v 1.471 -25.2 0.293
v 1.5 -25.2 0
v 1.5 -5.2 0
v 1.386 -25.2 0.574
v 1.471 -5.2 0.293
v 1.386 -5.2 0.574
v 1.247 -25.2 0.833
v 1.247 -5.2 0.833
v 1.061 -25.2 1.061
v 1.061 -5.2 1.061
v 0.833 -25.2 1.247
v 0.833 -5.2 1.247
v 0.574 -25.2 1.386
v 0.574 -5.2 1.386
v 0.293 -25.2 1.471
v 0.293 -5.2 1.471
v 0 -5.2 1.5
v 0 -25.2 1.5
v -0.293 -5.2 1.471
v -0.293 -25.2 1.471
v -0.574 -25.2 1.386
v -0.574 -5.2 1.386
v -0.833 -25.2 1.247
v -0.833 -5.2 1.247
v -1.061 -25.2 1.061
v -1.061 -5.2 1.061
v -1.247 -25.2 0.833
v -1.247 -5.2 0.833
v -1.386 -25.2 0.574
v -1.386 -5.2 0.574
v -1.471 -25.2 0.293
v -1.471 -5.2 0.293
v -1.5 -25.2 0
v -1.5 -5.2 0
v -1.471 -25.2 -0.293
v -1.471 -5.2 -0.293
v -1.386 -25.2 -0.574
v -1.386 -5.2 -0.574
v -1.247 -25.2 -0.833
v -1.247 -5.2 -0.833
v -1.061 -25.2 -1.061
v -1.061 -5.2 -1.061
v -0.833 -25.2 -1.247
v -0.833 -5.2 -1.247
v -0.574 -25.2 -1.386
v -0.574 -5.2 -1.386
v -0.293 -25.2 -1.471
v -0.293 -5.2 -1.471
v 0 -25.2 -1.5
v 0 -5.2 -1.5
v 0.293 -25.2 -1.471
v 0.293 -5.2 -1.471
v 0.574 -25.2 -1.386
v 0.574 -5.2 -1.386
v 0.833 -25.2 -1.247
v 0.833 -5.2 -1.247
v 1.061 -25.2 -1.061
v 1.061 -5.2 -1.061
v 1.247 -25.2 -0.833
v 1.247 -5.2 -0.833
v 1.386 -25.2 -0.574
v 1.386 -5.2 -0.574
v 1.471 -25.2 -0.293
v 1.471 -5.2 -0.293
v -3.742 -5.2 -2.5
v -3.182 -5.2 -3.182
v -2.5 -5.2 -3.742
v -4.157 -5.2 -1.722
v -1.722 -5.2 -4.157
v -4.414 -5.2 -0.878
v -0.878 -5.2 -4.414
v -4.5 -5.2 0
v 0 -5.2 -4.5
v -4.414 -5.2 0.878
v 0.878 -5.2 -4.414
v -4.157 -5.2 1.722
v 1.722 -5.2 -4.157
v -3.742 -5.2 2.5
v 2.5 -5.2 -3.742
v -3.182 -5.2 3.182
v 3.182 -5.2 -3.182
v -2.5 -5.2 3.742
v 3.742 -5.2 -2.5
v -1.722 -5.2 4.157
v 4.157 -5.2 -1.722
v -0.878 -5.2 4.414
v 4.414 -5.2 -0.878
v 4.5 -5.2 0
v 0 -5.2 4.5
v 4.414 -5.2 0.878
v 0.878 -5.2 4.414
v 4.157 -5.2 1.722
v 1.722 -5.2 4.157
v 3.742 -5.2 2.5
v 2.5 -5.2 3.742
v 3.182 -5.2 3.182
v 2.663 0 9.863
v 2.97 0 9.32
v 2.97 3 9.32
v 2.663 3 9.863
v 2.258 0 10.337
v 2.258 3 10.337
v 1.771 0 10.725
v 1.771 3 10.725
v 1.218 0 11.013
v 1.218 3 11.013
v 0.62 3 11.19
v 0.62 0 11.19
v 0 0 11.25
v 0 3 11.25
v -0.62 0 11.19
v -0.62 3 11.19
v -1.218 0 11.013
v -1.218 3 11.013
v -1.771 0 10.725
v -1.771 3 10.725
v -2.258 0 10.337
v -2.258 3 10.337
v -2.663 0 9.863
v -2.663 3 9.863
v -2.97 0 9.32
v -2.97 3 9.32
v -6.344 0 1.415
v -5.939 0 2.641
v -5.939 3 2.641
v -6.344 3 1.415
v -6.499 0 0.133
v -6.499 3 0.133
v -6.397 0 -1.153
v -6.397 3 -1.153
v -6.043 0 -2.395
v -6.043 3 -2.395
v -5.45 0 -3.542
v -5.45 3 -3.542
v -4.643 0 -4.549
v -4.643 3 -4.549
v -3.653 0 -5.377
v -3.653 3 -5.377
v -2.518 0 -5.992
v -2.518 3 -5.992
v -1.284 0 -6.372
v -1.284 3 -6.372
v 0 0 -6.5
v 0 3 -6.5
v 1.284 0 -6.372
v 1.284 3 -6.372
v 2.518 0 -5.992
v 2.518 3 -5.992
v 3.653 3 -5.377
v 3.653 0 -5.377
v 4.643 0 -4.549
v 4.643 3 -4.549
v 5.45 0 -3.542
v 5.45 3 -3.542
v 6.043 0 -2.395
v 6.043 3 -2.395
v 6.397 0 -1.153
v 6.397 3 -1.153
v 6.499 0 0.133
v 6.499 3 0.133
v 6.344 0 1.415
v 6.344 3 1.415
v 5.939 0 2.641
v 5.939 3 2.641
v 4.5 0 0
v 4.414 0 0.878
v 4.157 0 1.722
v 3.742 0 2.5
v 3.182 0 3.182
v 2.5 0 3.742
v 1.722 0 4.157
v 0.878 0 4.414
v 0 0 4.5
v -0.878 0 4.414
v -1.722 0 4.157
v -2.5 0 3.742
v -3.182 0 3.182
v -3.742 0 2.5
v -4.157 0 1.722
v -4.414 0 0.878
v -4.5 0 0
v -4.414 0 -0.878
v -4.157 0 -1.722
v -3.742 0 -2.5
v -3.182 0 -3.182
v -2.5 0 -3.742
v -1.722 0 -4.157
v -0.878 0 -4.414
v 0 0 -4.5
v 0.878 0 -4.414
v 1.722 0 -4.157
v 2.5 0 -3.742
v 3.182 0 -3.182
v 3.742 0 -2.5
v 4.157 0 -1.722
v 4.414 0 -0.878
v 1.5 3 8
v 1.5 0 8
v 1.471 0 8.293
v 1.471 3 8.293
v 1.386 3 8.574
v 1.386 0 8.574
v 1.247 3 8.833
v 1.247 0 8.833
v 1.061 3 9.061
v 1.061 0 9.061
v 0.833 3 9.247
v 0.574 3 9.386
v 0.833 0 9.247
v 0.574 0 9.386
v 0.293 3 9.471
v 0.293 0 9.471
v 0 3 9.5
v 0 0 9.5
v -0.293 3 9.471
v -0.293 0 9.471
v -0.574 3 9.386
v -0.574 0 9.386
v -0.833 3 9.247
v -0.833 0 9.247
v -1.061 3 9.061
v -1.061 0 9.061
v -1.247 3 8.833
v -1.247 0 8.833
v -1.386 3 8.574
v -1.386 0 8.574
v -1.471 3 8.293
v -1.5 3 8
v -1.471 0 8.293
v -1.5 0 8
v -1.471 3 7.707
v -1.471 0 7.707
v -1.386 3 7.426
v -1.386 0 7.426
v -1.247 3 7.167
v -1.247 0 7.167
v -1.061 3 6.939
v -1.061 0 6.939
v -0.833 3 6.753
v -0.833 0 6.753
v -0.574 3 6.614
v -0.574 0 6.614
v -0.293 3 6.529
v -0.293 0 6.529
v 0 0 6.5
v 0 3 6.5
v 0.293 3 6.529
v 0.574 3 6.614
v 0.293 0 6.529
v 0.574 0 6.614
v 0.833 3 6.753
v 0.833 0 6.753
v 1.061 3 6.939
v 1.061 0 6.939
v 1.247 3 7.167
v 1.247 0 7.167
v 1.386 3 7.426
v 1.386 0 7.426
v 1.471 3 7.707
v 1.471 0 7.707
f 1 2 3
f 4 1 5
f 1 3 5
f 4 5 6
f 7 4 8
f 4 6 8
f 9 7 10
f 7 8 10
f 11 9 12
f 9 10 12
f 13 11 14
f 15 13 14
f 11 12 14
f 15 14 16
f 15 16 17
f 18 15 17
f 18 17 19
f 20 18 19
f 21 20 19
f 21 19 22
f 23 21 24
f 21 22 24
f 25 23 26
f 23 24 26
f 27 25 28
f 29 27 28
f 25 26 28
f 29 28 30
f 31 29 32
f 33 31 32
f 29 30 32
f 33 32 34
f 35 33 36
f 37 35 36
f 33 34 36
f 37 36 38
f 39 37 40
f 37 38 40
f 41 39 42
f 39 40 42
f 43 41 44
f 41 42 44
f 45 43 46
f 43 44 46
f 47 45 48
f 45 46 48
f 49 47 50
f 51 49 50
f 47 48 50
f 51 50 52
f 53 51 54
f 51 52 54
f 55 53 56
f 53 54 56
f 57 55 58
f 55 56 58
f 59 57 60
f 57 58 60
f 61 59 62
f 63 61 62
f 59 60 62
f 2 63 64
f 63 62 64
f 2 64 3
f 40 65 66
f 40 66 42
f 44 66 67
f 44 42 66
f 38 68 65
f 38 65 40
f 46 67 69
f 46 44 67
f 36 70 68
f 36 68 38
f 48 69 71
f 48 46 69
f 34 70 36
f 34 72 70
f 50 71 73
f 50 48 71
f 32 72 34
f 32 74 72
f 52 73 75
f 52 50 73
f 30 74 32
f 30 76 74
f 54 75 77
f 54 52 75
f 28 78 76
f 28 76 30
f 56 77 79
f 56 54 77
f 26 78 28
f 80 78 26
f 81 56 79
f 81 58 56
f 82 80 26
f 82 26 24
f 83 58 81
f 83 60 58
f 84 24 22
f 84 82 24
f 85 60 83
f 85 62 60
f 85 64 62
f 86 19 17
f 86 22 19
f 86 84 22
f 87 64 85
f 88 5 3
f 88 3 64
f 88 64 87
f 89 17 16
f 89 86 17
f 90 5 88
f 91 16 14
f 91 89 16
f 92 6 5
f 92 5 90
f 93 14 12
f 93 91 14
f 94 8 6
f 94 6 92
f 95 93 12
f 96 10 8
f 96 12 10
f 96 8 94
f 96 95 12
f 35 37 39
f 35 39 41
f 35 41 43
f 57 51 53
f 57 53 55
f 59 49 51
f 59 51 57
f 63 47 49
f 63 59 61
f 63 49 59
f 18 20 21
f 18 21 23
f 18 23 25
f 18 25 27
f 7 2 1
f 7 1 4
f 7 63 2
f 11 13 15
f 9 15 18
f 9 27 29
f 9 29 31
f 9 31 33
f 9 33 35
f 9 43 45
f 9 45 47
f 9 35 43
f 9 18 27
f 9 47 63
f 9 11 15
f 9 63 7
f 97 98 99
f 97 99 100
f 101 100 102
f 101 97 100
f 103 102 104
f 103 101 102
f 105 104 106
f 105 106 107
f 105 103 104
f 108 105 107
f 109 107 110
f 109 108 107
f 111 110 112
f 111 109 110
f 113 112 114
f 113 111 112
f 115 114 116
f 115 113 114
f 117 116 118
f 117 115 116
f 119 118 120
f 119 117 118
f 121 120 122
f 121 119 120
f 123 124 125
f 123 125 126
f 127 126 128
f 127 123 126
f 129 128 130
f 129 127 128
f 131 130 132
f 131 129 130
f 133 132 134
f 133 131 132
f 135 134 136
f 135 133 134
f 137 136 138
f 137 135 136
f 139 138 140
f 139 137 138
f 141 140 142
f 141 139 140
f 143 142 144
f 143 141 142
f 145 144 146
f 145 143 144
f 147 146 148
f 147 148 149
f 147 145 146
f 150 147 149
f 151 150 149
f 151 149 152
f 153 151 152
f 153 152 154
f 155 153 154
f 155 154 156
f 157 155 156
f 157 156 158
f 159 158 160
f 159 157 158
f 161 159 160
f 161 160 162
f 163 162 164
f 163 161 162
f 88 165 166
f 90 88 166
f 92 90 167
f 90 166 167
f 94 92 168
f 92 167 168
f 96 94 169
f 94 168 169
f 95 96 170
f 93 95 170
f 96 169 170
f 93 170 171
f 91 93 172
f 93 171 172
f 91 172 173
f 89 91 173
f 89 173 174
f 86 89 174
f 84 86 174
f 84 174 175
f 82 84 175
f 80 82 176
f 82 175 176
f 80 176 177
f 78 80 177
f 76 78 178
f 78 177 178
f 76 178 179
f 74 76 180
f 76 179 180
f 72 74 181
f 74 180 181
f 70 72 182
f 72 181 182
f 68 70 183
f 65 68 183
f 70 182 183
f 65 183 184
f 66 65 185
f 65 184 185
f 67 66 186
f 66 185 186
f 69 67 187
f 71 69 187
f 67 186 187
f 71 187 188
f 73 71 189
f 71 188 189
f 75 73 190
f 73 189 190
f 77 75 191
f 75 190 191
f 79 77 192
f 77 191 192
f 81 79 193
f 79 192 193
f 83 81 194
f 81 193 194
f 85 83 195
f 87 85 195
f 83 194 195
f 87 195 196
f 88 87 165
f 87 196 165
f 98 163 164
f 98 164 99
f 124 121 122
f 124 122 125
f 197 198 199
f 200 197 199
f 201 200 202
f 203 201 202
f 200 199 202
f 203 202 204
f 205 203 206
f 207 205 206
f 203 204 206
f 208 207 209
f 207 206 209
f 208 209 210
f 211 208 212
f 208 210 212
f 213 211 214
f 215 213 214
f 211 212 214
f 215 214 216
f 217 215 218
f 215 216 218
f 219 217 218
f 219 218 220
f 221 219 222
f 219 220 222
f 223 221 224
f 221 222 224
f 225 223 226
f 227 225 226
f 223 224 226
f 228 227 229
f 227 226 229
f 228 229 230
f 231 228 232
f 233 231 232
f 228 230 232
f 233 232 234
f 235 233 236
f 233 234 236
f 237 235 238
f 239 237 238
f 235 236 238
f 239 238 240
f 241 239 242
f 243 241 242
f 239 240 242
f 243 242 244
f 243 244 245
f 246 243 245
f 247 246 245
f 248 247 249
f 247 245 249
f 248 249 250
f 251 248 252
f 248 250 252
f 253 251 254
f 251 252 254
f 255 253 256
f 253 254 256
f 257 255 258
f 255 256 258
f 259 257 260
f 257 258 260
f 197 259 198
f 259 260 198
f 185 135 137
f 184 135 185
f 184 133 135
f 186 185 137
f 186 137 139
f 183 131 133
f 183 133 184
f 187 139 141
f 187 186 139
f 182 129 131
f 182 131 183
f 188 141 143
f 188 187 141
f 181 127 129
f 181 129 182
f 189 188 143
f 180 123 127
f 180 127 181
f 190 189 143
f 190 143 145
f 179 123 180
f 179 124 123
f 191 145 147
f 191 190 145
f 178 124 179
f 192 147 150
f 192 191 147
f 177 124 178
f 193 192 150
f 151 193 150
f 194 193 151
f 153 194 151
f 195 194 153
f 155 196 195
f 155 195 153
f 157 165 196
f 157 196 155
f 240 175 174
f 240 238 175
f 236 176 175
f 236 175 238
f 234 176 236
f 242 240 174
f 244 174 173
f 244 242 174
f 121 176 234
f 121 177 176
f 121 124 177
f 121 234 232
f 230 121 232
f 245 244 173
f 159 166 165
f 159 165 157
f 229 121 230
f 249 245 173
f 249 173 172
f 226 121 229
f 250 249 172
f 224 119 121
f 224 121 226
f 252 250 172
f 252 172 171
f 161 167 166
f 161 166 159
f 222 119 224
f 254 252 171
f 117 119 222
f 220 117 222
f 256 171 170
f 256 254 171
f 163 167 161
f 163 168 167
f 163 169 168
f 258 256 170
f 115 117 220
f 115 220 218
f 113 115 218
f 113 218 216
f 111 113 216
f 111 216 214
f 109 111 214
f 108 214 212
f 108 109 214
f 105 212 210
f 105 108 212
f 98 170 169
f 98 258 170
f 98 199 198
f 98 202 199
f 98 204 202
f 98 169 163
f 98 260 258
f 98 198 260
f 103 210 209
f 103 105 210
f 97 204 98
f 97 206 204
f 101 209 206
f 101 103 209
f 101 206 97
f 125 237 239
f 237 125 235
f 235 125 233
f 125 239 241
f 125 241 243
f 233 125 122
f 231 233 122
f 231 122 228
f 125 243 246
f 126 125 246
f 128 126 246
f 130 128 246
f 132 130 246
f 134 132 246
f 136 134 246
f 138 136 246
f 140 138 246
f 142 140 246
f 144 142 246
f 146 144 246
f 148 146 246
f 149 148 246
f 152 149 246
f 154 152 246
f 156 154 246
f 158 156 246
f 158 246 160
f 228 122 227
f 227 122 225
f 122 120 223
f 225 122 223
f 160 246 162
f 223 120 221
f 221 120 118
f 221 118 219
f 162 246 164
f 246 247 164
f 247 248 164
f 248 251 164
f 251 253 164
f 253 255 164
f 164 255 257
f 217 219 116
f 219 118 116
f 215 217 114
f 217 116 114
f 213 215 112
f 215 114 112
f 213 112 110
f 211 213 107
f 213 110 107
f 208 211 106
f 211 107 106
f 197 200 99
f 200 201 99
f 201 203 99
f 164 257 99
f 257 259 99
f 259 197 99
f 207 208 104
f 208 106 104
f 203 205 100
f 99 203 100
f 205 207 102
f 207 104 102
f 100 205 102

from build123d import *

# Parameters (mm, degrees)
F0_R     = 1.5
F1_DEPTH = 3
F2_R     = 4.5
F3_DEPTH = 5.2
F4_R     = 1.5
F5_DEPTH = 20


with BuildPart() as f1:
    # F0 (on Front) → F1 (new body)
    with BuildSketch(Plane.XZ):
        with BuildLine():
            Line((5.9394528039, 2.640625), (2.9697264019, 9.3203125))
            ThreePointArc((2.9697264019, 9.3203125), (0, 11.25), (-2.9697264019, 9.3203125))
            Line((-2.9697264019, 9.3203125), (-5.9394528039, 2.640625))
            ThreePointArc((-5.9394528039, 2.640625), (0, -6.5), (5.9394528039, 2.640625))
        make_face()
        with Locations((0, 8)):
            Circle(F0_R, mode=Mode.SUBTRACT)
    extrude(amount=-F1_DEPTH)

    # F2 (on face) → F3 (join)
    with BuildSketch(Plane.XZ):
        Circle(F2_R)
    extrude(amount=F3_DEPTH)

    # F4 (on face) → F5 (join)
    with BuildSketch(Plane.XZ.offset(5.2)):
        Circle(F4_R)
    extrude(amount=F5_DEPTH)


solid = f1.part
